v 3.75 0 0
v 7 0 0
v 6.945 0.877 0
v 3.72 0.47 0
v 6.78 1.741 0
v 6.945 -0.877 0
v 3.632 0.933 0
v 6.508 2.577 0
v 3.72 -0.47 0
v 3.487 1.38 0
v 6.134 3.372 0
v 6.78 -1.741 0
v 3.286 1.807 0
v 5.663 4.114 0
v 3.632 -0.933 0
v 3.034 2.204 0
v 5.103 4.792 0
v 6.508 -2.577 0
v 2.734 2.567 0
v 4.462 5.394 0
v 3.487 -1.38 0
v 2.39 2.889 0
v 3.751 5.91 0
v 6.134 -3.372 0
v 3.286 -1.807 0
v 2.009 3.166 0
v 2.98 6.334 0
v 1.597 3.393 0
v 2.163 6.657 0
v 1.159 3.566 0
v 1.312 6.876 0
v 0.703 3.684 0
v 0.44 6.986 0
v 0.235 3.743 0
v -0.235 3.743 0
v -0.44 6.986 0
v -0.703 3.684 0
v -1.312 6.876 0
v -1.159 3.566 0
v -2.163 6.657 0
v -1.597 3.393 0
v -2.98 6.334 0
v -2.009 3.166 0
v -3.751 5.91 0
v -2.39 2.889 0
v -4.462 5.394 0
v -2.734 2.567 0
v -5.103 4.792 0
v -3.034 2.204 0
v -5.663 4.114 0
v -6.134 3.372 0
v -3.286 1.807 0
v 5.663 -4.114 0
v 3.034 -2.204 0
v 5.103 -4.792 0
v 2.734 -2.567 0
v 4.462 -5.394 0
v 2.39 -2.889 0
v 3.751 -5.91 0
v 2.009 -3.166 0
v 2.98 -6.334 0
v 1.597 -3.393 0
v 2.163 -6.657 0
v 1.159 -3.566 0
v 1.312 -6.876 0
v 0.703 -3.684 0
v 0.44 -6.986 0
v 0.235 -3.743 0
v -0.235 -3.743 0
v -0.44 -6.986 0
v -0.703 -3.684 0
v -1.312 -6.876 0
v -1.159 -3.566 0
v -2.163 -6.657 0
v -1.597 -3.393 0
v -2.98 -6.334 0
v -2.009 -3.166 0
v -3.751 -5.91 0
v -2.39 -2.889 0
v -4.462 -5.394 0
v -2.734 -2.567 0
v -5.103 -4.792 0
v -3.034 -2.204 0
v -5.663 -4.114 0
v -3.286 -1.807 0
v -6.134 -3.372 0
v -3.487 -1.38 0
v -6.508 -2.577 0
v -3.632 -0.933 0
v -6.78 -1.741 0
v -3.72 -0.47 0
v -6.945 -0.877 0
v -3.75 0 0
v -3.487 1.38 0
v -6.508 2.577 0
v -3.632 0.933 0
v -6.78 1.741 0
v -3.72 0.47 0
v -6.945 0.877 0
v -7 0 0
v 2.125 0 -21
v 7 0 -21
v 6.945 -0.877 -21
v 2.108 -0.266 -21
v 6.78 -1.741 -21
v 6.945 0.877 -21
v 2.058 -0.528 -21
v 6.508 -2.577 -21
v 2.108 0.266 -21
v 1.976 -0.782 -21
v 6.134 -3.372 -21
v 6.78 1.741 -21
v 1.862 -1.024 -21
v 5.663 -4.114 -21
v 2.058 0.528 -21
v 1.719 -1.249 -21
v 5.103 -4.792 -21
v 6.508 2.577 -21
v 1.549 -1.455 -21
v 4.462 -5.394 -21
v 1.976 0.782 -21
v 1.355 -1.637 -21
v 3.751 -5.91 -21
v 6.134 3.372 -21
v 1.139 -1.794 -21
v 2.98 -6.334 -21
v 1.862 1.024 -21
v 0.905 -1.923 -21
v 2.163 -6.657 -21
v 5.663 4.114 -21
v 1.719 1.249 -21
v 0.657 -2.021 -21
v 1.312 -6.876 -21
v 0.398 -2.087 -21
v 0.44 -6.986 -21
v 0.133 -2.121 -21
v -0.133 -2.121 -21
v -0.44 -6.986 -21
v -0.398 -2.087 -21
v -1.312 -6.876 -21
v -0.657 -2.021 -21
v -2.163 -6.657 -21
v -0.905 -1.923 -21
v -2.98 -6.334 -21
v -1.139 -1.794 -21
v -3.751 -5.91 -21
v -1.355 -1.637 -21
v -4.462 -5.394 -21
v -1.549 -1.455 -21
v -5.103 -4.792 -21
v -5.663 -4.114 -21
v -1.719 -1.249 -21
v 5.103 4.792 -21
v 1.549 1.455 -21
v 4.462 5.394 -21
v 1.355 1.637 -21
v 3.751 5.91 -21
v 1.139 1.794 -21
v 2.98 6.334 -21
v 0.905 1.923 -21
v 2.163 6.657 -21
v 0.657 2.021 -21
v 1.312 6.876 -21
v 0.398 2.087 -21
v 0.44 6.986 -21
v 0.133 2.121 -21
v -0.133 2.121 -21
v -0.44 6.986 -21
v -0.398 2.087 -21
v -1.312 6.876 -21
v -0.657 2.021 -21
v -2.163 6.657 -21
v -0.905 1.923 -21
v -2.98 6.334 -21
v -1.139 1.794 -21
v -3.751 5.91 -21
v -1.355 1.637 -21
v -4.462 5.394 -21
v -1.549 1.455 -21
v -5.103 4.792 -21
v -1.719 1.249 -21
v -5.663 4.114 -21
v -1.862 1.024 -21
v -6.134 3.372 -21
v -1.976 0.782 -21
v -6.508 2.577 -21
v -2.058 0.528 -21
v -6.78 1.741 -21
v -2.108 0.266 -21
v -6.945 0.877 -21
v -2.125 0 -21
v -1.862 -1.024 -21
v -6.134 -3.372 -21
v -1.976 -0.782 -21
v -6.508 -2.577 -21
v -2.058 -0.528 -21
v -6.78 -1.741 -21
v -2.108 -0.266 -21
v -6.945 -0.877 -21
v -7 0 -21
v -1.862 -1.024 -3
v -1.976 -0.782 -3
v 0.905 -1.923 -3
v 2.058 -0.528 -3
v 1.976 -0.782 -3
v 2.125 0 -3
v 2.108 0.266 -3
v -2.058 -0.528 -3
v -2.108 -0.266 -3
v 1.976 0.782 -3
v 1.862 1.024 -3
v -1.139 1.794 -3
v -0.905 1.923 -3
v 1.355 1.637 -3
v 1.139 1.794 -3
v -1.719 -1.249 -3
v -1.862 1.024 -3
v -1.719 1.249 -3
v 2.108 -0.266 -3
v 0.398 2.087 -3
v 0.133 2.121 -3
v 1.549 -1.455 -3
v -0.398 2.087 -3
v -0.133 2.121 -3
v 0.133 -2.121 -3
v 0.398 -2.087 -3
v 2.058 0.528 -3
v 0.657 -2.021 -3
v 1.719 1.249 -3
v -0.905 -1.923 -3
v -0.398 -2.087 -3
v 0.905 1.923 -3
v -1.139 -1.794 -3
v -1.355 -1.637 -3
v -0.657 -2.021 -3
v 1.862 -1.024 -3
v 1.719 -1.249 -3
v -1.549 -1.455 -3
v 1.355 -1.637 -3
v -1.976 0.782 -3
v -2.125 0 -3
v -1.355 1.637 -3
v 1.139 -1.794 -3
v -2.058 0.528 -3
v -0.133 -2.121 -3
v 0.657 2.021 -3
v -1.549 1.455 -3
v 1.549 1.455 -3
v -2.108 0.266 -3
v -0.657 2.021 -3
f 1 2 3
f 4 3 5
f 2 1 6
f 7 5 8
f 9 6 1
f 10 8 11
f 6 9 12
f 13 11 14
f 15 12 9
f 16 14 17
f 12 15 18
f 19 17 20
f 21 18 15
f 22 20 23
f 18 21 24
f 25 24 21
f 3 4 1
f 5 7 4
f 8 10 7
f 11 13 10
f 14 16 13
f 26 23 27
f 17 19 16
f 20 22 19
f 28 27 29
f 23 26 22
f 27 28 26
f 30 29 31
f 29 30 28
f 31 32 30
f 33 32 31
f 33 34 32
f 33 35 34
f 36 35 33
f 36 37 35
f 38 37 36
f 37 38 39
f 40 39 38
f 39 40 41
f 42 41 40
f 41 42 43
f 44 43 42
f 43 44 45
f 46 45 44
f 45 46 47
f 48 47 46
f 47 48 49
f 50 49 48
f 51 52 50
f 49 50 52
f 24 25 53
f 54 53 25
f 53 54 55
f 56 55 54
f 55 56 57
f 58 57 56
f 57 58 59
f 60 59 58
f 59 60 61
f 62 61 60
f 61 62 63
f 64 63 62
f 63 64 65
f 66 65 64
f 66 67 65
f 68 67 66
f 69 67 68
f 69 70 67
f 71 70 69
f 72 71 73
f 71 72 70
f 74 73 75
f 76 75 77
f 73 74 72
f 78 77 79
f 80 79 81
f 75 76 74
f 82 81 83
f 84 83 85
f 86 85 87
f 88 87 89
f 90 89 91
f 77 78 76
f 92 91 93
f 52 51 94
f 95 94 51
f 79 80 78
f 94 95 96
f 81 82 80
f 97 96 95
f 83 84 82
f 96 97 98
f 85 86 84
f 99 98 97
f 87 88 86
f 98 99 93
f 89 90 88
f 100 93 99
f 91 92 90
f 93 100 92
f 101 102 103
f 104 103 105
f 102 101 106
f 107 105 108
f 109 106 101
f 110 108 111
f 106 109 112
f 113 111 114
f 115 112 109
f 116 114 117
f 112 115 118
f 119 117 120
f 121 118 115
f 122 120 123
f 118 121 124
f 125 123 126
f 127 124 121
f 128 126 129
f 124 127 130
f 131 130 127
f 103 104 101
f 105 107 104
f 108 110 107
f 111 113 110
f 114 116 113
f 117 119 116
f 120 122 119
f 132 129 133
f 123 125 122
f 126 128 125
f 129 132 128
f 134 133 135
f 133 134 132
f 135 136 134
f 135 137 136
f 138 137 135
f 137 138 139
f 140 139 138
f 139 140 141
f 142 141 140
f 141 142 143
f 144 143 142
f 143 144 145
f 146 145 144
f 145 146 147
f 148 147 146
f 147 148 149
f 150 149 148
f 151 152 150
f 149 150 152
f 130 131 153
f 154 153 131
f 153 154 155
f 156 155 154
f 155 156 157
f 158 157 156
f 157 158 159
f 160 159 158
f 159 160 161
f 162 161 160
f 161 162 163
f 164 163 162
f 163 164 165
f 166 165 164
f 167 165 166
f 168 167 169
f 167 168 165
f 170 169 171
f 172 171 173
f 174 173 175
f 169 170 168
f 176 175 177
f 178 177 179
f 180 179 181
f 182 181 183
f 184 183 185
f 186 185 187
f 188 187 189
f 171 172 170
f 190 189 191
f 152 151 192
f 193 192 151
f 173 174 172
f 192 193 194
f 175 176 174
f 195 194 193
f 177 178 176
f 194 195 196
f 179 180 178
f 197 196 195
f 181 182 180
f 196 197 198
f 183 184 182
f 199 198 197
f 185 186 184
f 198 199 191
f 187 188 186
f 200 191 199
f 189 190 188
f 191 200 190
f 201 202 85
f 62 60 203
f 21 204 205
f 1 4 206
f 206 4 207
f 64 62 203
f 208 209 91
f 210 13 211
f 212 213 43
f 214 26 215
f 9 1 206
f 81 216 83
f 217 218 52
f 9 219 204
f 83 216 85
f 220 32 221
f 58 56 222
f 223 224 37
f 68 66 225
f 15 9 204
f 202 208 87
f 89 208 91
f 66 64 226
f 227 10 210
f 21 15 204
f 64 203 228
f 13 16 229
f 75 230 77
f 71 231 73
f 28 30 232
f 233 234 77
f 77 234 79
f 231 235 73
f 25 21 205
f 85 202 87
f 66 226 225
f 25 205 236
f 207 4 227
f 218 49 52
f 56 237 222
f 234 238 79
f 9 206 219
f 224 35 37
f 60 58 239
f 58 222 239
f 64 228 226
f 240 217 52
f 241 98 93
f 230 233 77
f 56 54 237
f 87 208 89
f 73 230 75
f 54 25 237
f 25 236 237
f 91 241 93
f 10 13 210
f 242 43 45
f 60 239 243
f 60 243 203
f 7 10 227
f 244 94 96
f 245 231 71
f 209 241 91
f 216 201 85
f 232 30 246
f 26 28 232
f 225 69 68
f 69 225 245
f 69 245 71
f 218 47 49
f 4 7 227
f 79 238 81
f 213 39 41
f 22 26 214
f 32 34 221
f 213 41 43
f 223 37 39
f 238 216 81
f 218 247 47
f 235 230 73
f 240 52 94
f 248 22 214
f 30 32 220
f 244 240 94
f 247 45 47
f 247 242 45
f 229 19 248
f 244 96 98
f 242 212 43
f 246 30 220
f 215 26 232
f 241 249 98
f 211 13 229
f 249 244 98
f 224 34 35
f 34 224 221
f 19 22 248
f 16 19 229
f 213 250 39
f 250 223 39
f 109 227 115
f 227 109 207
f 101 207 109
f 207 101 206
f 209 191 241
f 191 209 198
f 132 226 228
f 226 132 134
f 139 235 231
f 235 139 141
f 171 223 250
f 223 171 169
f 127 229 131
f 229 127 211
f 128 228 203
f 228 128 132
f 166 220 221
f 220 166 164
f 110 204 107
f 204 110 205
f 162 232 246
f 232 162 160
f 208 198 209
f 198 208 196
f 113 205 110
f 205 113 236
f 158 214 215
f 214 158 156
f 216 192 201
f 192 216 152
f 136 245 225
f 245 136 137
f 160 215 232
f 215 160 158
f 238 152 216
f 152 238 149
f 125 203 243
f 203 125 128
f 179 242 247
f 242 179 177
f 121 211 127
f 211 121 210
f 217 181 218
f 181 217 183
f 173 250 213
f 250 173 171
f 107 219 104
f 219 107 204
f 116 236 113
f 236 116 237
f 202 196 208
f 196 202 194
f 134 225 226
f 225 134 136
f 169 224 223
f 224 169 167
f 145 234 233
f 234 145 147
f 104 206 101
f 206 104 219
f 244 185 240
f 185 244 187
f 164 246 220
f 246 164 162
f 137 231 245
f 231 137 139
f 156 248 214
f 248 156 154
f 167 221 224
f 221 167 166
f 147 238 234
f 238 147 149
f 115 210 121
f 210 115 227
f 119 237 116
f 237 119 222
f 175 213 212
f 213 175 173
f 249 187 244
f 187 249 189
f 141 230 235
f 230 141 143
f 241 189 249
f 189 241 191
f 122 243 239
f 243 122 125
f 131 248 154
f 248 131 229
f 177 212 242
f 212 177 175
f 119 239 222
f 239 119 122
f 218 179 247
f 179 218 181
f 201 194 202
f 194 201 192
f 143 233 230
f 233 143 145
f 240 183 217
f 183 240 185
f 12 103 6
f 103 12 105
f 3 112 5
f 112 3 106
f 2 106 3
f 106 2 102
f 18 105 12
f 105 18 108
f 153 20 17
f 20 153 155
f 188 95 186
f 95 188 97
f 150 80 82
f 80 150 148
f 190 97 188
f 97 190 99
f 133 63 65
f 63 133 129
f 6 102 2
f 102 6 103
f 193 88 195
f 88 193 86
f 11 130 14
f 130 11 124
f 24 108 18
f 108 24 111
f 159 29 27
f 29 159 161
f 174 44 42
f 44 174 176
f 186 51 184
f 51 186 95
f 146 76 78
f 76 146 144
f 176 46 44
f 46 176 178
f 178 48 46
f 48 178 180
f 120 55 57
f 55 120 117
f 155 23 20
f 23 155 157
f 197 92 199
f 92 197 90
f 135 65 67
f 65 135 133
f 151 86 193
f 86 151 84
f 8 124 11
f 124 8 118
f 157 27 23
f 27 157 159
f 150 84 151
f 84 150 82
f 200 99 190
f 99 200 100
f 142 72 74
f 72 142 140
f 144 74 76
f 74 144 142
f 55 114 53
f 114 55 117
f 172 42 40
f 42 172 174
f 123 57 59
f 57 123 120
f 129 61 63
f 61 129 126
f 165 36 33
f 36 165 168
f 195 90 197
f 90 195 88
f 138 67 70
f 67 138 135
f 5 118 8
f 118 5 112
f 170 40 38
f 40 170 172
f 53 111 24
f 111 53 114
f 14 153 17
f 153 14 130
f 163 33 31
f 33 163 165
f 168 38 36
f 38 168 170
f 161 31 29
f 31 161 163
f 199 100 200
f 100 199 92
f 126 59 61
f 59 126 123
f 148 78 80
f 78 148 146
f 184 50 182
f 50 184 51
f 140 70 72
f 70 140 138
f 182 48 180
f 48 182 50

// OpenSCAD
$fn = 50;


difference() {
	union() {
		translate(v = [0, 0, -21.0000000000]) {
			cylinder(h = 21, r = 7.0000000000);
		}
		cylinder(h = 0, r = 17.0000000000);
	}
	union() {
		translate(v = [0, 0, 0]) {
			rotate(a = [0, 0, 0]) {
				difference() {
					union() {
						#translate(v = [0, 0, -21.0000000000]) {
							cylinder(h = 21, r = 2.0000000000);
						}
						#translate(v = [0, 0, -3]) {
							cylinder(h = 3, r1 = 2.1250000000, r2 = 3.7500000000);
						}
						#translate(v = [0, 0, -21.0000000000]) {
							cylinder(h = 21, r = 2.1250000000);
						}
						#translate(v = [0, 0, -21.0000000000]) {
							cylinder(h = 21, r = 2.0000000000);
						}
					}
					union();
				}
			}
		}
	}
}
